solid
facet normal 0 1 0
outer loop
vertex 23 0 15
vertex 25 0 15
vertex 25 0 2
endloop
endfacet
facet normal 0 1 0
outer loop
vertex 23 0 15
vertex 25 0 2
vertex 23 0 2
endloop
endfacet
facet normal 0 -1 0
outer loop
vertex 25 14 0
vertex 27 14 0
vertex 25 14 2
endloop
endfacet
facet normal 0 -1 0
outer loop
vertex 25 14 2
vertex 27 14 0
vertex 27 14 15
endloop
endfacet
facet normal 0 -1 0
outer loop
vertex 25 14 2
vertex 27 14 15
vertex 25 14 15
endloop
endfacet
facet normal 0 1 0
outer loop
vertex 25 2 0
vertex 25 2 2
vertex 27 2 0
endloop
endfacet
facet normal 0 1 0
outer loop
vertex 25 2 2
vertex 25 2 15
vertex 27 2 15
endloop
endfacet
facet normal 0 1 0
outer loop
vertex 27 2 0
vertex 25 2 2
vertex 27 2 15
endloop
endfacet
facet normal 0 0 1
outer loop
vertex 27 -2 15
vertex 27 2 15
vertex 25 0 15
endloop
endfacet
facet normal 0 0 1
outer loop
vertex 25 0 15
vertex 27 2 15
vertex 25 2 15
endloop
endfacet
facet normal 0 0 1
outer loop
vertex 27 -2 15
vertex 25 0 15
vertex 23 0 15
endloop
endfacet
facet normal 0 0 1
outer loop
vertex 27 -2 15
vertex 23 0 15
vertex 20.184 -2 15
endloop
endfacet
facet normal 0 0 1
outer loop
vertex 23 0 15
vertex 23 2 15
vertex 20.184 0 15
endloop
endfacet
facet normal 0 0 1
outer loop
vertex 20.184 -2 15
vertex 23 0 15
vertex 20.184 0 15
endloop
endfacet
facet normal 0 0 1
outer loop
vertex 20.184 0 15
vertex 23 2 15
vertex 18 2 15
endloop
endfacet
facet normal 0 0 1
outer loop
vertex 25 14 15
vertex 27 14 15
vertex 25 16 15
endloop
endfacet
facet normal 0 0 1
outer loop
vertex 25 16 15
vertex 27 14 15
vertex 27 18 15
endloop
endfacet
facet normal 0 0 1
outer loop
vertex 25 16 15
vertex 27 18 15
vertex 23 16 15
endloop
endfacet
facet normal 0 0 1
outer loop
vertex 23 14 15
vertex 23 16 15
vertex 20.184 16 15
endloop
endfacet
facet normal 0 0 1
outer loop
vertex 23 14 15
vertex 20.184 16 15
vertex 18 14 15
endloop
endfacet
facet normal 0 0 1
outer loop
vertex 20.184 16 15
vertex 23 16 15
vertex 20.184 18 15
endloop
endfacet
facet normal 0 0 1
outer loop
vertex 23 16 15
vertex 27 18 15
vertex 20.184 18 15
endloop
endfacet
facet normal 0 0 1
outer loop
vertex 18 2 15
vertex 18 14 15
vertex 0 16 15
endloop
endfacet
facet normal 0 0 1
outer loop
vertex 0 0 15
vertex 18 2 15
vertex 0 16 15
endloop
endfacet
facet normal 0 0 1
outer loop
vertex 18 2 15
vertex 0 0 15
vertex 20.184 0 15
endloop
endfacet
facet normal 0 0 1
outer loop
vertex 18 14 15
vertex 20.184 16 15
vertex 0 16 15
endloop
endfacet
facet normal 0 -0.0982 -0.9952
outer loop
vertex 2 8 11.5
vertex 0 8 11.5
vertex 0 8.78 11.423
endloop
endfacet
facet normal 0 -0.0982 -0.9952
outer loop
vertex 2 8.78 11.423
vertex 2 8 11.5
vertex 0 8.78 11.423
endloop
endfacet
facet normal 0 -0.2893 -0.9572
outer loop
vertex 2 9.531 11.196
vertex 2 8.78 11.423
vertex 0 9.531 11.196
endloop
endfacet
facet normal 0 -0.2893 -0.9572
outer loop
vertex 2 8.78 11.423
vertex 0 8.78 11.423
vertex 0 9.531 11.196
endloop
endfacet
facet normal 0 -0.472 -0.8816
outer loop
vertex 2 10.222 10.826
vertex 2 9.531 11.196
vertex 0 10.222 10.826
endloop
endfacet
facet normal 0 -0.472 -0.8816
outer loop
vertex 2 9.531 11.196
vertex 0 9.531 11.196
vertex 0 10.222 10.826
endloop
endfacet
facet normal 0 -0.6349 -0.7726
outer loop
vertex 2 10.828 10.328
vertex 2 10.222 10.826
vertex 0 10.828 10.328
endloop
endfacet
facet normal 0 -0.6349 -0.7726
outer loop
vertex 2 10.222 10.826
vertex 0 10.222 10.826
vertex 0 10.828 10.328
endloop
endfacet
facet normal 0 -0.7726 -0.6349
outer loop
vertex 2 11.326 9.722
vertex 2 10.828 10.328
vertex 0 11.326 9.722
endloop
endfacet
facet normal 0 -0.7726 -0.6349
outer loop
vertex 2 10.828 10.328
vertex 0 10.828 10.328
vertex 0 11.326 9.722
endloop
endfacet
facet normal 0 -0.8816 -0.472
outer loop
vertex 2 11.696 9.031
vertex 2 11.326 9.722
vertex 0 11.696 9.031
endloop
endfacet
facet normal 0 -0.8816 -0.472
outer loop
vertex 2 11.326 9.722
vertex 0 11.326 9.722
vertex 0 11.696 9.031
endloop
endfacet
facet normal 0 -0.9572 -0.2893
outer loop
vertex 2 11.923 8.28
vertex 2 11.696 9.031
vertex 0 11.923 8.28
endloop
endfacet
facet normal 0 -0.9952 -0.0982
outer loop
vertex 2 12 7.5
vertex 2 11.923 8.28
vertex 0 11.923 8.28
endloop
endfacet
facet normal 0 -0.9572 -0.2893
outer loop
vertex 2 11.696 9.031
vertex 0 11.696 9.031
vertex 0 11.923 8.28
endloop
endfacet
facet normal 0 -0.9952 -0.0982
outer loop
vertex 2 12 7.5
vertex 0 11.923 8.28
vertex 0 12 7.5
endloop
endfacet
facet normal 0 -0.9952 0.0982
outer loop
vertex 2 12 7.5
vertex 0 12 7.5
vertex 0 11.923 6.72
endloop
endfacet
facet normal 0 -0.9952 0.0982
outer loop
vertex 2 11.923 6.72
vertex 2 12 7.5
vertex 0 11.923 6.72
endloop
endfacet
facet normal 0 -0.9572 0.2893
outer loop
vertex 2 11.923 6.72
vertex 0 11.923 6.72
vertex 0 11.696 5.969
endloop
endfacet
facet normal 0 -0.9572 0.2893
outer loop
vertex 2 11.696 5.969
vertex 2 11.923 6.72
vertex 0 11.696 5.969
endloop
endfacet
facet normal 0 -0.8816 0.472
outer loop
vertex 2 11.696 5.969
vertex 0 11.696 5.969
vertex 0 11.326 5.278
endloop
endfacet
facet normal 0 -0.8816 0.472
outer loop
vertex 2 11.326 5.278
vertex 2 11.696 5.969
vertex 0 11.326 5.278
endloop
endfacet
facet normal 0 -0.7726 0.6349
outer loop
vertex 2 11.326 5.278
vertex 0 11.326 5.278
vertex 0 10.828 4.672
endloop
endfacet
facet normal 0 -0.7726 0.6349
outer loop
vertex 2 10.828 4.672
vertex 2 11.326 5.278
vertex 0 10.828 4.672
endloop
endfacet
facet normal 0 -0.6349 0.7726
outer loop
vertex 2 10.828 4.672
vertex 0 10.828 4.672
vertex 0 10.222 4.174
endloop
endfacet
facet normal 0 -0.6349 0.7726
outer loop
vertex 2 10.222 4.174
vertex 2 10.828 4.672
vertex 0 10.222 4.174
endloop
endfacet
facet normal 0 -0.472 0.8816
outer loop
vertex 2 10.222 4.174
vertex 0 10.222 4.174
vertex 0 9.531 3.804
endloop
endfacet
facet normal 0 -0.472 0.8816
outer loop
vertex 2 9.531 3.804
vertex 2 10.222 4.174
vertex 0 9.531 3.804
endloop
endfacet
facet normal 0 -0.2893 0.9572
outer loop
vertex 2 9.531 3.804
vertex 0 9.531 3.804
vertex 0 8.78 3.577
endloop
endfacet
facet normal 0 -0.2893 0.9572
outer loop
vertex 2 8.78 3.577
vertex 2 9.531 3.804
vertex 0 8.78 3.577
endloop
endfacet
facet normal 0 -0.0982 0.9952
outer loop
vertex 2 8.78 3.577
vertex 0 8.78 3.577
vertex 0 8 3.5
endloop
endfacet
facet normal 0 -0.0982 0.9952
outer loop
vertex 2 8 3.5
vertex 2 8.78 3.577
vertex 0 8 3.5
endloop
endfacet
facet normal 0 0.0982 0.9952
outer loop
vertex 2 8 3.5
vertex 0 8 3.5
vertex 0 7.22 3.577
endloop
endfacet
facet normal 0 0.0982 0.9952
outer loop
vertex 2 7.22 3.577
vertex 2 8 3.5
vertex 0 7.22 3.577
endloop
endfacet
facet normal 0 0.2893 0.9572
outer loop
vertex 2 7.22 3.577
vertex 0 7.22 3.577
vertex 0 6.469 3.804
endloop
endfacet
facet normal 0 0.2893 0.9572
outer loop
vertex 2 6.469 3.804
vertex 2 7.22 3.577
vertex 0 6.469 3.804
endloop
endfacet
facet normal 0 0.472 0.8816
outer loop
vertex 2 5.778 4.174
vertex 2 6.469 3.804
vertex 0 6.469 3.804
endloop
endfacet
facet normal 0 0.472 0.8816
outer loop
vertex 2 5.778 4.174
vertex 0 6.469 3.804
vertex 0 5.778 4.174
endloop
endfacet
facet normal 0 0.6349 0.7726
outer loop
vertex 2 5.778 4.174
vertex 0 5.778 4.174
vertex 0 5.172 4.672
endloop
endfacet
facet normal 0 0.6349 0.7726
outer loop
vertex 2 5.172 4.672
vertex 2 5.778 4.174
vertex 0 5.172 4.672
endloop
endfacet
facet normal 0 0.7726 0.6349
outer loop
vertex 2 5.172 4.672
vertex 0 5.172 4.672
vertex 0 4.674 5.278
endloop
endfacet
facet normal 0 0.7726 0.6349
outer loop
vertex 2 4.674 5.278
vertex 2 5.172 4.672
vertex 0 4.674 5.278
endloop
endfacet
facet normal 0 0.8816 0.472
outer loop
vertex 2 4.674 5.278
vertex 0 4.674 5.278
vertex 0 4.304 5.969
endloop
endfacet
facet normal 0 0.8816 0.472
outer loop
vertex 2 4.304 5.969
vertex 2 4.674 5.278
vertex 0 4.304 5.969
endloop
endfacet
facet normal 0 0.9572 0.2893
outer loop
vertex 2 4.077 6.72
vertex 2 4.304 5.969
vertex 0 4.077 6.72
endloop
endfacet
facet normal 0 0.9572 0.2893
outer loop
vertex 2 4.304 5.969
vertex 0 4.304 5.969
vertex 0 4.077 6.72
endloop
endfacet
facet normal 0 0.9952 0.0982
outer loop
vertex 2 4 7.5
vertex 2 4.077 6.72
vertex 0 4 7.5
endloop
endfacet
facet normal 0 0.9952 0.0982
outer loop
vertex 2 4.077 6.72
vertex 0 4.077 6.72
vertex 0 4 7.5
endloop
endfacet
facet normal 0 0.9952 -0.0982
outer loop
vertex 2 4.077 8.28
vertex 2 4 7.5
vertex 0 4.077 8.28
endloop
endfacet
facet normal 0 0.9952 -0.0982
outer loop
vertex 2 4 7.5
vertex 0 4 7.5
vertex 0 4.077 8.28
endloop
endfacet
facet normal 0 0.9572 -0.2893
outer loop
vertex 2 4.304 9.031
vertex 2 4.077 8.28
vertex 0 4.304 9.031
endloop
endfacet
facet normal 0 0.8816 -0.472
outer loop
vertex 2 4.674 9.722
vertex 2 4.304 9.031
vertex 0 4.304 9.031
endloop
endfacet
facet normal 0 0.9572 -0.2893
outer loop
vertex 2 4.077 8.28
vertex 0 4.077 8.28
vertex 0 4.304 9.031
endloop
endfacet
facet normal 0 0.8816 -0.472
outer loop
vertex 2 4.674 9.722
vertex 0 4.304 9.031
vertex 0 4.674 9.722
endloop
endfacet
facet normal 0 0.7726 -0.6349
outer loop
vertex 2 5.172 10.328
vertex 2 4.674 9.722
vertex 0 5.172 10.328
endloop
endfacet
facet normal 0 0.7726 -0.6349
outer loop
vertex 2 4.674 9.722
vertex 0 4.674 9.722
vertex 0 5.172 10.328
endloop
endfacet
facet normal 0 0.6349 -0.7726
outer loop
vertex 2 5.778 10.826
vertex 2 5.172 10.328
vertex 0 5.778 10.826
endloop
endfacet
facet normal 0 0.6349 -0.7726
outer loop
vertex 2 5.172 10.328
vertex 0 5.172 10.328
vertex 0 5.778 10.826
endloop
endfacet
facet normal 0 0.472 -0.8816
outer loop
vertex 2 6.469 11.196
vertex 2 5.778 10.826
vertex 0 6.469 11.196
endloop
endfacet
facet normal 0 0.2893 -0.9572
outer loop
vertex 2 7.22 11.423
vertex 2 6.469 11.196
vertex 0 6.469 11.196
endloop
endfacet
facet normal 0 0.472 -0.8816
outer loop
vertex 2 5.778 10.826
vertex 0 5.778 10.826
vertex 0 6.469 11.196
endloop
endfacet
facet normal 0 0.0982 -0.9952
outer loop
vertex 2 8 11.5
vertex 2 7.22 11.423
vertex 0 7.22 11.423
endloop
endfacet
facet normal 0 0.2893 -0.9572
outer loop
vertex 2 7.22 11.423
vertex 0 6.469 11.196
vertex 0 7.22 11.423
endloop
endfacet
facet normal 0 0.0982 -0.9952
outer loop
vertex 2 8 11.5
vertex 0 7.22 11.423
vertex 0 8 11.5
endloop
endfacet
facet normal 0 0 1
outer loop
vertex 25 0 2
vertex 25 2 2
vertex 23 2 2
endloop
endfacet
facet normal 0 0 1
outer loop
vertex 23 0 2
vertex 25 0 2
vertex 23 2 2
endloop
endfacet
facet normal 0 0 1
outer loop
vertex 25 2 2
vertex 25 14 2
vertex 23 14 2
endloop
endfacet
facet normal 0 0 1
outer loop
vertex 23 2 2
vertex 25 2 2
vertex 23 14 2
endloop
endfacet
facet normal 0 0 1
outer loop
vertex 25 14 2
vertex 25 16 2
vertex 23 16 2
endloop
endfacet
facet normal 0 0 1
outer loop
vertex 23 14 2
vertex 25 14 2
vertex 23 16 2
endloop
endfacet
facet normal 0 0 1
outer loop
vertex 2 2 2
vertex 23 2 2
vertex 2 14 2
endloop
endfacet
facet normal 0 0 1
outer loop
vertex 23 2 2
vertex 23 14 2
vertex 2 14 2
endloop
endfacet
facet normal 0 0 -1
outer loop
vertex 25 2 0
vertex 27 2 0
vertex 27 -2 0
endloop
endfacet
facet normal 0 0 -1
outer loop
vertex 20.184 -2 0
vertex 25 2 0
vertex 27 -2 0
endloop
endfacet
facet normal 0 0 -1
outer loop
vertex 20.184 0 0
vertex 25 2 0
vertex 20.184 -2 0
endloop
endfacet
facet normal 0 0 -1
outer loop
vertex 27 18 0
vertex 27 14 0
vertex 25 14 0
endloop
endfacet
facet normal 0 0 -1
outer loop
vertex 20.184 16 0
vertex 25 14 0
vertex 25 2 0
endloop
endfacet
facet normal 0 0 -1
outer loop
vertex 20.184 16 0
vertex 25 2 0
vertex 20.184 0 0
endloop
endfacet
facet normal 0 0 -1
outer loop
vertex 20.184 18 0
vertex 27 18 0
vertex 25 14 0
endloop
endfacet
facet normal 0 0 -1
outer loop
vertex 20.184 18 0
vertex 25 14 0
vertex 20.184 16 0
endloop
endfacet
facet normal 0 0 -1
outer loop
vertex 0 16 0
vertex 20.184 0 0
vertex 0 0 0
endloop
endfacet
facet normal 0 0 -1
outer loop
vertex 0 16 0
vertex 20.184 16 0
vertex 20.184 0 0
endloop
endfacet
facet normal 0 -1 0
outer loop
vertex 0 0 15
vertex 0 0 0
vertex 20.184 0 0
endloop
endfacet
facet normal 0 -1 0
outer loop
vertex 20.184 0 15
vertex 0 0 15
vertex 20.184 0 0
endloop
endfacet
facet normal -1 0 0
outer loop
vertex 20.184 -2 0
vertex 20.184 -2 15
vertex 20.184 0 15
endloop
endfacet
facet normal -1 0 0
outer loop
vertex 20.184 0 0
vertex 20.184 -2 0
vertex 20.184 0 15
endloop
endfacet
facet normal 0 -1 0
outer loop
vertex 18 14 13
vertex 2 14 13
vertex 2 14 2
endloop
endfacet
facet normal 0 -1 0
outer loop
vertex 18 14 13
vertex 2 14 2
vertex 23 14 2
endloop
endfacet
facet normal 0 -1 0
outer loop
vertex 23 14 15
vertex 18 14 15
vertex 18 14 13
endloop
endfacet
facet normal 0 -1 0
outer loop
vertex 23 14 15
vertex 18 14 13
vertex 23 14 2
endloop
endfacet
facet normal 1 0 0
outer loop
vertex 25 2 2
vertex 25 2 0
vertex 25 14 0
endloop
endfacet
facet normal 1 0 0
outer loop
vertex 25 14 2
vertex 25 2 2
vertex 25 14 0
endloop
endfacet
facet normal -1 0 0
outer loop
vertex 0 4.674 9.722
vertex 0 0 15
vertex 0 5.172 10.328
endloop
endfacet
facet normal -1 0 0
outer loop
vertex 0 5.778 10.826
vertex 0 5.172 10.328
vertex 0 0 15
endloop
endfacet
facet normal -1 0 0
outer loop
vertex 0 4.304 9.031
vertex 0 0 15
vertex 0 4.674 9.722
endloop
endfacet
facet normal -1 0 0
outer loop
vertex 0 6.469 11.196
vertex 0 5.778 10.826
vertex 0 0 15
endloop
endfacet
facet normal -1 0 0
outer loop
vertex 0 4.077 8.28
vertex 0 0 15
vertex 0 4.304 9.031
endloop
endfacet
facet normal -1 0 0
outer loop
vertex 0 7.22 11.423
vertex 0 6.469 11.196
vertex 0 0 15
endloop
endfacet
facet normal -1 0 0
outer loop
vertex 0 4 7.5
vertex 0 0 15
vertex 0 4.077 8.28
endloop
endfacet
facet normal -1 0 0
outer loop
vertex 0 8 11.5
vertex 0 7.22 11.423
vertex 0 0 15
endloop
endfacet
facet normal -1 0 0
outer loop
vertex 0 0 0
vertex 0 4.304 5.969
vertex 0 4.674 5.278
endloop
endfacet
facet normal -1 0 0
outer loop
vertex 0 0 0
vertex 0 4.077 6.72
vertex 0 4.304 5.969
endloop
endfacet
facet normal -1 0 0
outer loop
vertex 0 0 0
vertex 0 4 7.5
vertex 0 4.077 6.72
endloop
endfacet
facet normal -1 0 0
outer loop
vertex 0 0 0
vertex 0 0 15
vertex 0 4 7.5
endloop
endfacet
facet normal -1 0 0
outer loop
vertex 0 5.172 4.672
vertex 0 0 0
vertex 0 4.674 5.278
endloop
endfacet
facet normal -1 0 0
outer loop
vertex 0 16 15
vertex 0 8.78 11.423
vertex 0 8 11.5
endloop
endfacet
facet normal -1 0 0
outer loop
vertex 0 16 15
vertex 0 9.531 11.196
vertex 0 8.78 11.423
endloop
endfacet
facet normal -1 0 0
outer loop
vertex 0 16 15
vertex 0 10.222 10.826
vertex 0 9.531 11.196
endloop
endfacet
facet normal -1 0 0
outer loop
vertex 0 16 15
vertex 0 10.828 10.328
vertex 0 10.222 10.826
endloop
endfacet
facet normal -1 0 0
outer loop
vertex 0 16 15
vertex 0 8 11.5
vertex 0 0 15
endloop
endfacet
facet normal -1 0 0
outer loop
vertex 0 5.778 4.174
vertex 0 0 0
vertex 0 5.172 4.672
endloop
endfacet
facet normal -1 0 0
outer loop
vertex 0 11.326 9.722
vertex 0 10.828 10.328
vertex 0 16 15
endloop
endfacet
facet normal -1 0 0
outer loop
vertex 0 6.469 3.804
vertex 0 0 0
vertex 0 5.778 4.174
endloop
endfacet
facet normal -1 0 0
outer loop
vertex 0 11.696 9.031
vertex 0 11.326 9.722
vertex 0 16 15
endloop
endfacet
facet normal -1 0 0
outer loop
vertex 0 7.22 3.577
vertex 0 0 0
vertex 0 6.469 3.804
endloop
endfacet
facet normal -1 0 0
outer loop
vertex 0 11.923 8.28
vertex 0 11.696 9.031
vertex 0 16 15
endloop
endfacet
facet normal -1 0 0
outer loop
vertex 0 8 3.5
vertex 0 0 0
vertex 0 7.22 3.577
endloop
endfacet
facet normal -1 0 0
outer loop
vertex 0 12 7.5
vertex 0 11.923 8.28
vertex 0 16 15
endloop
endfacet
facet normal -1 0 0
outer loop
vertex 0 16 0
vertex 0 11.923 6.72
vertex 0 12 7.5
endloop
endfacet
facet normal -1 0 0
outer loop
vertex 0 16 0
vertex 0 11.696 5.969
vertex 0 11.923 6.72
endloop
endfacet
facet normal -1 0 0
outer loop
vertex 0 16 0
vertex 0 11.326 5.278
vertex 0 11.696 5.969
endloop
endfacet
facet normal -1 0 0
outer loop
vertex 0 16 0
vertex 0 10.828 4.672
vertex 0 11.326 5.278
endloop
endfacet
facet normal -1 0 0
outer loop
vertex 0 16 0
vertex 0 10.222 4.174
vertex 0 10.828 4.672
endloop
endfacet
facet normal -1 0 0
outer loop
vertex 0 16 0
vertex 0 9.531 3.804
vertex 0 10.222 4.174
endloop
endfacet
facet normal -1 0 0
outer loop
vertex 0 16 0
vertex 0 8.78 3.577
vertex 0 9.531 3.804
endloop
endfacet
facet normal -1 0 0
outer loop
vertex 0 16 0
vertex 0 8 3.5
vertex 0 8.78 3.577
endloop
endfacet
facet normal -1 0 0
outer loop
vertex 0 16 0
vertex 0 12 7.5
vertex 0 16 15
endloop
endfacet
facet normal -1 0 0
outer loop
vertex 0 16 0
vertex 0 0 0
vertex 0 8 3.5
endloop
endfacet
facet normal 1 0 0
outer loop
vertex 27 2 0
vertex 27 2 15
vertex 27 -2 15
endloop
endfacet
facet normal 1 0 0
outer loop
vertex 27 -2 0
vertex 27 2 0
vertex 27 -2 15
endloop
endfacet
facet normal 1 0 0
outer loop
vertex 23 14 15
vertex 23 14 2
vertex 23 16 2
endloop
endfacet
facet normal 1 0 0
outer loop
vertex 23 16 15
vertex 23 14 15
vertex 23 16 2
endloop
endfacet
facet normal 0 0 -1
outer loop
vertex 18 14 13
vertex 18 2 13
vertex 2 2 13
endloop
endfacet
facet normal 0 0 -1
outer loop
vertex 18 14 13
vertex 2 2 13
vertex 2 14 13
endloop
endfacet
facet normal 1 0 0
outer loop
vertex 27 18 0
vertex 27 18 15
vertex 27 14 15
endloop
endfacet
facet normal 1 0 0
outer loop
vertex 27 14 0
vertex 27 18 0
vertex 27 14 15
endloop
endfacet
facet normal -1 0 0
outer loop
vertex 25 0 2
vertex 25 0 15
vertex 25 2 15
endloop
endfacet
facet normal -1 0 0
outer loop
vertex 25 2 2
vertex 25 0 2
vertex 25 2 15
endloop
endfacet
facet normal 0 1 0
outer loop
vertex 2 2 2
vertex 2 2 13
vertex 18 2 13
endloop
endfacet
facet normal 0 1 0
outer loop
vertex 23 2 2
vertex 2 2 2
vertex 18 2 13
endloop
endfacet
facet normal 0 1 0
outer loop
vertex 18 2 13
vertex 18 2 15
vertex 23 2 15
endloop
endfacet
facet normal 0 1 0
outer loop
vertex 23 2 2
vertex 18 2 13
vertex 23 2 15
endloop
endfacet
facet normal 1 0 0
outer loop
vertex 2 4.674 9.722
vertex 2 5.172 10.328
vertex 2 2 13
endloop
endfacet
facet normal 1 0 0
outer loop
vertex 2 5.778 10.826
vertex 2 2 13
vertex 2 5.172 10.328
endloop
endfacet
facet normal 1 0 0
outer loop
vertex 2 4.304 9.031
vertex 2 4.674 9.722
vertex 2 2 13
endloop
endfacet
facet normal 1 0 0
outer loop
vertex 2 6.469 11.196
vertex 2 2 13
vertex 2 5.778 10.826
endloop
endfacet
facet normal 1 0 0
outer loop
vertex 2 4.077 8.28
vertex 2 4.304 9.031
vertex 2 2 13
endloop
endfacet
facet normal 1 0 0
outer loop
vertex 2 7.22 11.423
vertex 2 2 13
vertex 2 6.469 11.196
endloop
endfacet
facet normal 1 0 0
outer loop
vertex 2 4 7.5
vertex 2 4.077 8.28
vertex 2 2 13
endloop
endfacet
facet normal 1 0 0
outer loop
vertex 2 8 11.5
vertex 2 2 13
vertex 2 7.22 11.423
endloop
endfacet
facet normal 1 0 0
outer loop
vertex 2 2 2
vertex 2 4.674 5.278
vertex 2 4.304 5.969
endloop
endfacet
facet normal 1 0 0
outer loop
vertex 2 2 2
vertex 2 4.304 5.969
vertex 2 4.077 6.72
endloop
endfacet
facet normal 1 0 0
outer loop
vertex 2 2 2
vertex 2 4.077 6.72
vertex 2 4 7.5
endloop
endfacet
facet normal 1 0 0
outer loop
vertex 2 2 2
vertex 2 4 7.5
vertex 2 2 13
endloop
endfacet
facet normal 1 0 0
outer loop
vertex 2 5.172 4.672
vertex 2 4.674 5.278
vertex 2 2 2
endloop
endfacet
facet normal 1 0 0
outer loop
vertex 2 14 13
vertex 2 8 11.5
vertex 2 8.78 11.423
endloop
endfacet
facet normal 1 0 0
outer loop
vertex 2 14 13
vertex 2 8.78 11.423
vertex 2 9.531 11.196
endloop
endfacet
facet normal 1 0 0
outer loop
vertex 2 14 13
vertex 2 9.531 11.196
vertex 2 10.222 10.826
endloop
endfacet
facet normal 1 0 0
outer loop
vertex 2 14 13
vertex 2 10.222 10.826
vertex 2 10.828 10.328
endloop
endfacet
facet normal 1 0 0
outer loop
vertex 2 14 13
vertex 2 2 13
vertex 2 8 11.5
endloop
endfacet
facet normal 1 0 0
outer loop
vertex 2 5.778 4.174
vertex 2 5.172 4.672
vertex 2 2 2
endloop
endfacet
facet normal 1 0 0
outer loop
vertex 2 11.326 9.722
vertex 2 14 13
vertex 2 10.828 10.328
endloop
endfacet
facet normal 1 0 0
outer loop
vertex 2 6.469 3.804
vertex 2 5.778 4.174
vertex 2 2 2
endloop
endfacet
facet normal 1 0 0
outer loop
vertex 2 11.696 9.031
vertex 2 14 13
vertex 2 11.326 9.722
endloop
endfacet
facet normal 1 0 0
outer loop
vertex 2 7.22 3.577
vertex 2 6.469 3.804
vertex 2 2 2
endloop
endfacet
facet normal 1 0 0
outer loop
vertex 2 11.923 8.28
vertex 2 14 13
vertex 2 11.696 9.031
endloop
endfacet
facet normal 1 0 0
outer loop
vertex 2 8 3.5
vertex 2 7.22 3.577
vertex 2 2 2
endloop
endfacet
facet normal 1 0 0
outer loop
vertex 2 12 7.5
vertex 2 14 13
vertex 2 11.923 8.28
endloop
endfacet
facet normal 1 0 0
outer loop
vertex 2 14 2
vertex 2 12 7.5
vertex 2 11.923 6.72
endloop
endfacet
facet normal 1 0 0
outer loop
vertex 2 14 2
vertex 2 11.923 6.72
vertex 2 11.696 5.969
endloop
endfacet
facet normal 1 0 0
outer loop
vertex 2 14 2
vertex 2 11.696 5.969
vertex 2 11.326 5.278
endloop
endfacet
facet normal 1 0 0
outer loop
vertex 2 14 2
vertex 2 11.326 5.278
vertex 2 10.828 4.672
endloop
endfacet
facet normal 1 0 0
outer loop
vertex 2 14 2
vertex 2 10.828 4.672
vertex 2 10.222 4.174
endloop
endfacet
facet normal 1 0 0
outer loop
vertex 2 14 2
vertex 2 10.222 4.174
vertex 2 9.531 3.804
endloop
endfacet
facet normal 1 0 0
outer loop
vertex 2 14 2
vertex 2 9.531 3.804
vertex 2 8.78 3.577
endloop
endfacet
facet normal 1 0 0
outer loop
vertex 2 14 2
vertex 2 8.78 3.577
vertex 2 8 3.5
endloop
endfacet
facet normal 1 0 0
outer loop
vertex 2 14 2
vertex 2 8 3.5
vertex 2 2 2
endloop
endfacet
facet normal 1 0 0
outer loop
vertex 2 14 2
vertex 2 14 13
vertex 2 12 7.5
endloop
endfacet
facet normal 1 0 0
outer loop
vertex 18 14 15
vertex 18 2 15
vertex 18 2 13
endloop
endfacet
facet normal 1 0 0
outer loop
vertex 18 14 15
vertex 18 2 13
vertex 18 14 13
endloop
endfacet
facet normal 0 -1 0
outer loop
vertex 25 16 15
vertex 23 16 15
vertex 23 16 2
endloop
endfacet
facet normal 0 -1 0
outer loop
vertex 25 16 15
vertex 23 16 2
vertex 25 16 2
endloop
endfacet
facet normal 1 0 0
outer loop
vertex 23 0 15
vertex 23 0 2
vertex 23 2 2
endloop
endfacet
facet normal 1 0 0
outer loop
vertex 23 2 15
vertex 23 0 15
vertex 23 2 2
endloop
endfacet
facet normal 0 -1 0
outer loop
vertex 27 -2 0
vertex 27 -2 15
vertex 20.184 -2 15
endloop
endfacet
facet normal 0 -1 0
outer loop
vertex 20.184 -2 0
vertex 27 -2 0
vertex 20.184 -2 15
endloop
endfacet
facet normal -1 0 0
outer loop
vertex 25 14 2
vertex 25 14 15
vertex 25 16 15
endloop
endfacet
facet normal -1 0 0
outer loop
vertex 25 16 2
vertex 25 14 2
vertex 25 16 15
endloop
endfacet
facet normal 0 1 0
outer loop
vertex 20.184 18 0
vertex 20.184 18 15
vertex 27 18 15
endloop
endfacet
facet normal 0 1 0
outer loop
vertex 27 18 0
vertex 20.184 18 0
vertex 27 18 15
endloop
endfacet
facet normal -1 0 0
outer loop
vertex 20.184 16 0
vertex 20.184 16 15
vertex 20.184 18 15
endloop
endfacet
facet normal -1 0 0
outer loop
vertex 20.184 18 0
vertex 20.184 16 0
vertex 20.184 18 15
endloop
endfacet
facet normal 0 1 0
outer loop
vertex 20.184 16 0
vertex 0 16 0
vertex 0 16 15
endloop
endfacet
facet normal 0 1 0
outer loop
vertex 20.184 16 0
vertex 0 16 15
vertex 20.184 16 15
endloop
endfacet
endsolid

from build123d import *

# Parameters (mm, degrees)
CROQUIS1_W              = 23
CROQUIS1_H              = 16
SALIENTE_EXTRUIR1_DEPTH = 15
CROQUIS2_W              = 11
CROQUIS2_H              = 12
CORTAR_EXTRUIR1_DEPTH   = 21
CROQUIS4_R              = 4
CORTAR_EXTRUIR2_DEPTH   = 23
CROQUIS5_W              = 5
CROQUIS5_H              = 12
CORTAR_EXTRUIR3_DEPTH   = 2
SALIENTE_EXTRUIR2_DEPTH = 15
CROQUIS7_W              = 2
CROQUIS7_H              = 16
SALIENTE_EXTRUIR3_DEPTH = 2


with BuildPart() as part:
    # Croquis1 → Saliente-Extruir1 (new body)
    with BuildSketch(Plane.XY):
        with Locations((11.5, 8)):
            Rectangle(CROQUIS1_W, CROQUIS1_H)
    extrude(amount=SALIENTE_EXTRUIR1_DEPTH)

    # Croquis2 → Cortar-Extruir1 (cut)
    with BuildSketch(Plane(origin=(23, 0, 0), x_dir=(0, 0, -1), z_dir=(1, 0, 0))):
        with Locations((-7.5, 8)):
            Rectangle(CROQUIS2_W, CROQUIS2_H)
    extrude(amount=-CORTAR_EXTRUIR1_DEPTH, mode=Mode.SUBTRACT)

    # Croquis4 → Cortar-Extruir2 (cut)
    with BuildSketch(Plane.ZY):
        with Locations((7.5, 8)):
            Circle(CROQUIS4_R)
    extrude(amount=-CORTAR_EXTRUIR2_DEPTH, mode=Mode.SUBTRACT)

    # Croquis5 → Cortar-Extruir3 (cut)
    with BuildSketch(Plane.XY.offset(15)):
        with Locations((20.5, 8)):
            Rectangle(CROQUIS5_W, CROQUIS5_H)
    extrude(amount=-CORTAR_EXTRUIR3_DEPTH, mode=Mode.SUBTRACT)

    # Croquis6 → Saliente-Extruir2 (add)
    with BuildSketch(Plane.XY.offset(15)):
        Polygon((20.184075088, 16), (20.184075088, 18), (27, 18), (27, 14), (25, 14), (25, 16), (23, 16), align=None)
        Polygon((20.184075088, 0), (23, 0), (25, 0), (25, 2), (27, 2), (27, -2), (20.184075088, -2), align=None)
    extrude(amount=-SALIENTE_EXTRUIR2_DEPTH)

    # Croquis7 → Saliente-Extruir3 (add)
    with BuildSketch(Plane(origin=(0, 0, 0), x_dir=(-1, 0, 0), z_dir=(0, 0, -1))):
        with Locations((-24, 8)):
            Rectangle(CROQUIS7_W, CROQUIS7_H)
    extrude(amount=-SALIENTE_EXTRUIR3_DEPTH)


solid = part.part
